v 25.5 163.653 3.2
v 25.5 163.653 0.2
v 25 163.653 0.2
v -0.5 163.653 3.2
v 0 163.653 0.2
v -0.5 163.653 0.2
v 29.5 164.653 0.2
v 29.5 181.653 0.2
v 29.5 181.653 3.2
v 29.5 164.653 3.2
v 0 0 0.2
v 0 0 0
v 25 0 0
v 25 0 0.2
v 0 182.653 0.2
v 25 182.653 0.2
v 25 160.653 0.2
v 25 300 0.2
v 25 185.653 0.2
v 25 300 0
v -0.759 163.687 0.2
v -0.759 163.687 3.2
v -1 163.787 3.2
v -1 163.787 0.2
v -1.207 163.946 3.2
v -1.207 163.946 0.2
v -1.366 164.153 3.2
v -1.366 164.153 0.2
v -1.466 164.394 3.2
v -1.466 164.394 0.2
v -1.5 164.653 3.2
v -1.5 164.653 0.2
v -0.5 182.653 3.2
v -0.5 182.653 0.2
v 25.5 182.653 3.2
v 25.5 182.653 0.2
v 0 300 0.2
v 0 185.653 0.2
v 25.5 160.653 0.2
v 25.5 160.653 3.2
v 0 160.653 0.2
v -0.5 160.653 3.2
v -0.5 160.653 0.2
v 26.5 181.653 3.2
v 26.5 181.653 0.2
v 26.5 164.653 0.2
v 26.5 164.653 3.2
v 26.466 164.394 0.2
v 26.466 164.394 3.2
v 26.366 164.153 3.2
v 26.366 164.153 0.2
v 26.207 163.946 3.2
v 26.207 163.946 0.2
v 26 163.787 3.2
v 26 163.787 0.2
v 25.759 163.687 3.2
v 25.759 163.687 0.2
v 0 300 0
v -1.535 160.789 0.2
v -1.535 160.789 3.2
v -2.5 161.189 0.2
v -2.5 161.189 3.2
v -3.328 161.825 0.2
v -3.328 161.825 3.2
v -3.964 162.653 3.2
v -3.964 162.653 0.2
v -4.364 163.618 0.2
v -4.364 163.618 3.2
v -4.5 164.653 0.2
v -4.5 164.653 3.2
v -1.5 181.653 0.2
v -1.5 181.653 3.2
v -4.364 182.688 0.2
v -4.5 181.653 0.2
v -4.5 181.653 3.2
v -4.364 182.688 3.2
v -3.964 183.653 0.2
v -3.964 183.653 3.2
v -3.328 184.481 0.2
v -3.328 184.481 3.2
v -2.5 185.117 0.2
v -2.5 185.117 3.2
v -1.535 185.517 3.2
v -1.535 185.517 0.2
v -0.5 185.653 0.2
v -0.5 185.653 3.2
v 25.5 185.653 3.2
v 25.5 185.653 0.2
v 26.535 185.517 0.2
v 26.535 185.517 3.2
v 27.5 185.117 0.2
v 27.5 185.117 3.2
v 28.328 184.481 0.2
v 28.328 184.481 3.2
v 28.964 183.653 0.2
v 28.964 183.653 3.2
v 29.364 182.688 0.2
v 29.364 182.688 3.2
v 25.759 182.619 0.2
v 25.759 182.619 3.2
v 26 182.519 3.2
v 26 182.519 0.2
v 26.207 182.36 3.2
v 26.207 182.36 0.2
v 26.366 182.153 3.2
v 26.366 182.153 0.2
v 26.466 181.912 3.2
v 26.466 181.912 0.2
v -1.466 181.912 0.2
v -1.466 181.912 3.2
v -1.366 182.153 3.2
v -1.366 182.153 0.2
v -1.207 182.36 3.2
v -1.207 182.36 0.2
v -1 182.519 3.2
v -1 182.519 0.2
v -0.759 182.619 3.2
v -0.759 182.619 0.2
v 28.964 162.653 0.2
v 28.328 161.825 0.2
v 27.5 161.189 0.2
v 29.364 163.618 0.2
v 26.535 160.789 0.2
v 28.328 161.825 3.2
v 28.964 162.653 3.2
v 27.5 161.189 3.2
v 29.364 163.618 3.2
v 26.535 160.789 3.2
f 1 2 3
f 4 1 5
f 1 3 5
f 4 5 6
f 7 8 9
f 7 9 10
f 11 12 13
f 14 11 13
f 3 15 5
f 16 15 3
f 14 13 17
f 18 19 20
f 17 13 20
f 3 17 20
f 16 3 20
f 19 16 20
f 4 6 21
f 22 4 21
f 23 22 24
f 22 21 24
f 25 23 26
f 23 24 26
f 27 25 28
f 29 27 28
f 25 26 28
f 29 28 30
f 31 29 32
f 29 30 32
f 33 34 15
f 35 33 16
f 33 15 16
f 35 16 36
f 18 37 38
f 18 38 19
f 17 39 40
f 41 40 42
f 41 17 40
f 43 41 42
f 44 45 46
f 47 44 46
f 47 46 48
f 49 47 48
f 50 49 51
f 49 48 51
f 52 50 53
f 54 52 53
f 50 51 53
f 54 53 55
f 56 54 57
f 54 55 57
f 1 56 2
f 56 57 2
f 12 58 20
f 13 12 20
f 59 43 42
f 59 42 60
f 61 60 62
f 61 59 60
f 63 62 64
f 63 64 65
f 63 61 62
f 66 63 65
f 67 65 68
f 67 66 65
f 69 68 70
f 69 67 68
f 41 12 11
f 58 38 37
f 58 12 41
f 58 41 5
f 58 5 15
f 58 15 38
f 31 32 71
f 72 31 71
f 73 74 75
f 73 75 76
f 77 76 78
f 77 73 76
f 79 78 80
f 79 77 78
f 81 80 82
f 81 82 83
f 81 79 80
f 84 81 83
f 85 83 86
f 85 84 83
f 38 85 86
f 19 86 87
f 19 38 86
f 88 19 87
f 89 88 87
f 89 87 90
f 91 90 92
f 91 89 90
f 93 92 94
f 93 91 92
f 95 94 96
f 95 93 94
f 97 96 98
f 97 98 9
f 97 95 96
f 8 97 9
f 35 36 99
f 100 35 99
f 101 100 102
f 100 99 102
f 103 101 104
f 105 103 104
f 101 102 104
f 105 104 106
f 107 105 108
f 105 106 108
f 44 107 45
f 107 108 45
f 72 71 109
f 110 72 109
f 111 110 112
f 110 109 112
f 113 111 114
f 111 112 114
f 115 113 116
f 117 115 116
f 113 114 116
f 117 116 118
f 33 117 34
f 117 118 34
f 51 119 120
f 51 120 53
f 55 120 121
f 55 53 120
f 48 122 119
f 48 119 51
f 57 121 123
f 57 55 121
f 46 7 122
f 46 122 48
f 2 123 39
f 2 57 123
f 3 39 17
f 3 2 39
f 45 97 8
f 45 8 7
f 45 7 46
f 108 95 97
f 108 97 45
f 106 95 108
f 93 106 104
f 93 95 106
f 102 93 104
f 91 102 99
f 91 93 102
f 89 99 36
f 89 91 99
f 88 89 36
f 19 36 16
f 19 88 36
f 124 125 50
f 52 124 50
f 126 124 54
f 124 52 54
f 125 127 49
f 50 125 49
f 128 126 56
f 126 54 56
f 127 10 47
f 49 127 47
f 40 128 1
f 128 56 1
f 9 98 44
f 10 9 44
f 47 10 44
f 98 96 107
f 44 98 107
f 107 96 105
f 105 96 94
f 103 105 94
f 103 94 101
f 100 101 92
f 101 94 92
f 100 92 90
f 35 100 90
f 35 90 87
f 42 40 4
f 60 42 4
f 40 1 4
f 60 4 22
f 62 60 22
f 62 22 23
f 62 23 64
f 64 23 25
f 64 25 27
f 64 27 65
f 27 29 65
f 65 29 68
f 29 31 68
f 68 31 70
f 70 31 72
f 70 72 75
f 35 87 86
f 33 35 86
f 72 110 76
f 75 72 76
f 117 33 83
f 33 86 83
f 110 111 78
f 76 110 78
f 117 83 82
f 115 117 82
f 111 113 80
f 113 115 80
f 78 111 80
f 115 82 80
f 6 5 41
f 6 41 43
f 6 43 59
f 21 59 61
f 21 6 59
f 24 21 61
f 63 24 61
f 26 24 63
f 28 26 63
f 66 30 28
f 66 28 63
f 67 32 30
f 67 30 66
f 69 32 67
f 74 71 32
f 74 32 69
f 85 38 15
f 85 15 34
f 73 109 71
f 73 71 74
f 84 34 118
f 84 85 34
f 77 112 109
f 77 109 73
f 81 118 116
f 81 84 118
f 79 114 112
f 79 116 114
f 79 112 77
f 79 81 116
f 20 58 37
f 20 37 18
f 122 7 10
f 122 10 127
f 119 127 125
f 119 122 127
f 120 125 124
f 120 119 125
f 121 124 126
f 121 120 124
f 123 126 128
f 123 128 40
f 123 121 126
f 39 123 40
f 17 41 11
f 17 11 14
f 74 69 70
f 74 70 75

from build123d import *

# Parameters (mm, degrees)
ESQUISSE1_W      = 25
ESQUISSE1_H      = 300
EXTRUSION1_DEPTH = 0.2
EXTRUSION2_DEPTH = 3


with BuildPart() as part:
    # Esquisse1 → Extrusion1 (new body)
    with BuildSketch(Plane.XY):
        with Locations((12.5, 150)):
            Rectangle(ESQUISSE1_W, ESQUISSE1_H)
    extrude(amount=EXTRUSION1_DEPTH)

    # Esquisse2 → Extrusion2 (add)
    with BuildSketch(Plane.XY.offset(0.2)):
        with BuildLine():
            Line((-0.5, 185.652949425), (25.5, 185.652949425))
            ThreePointArc((25.5, 185.652949425), (28.328427125, 184.48137655), (29.5, 181.652949425))
            Line((29.5, 181.652949425), (29.5, 164.652949425))
            ThreePointArc((29.5, 164.652949425), (28.328427125, 161.8245223), (25.5, 160.652949425))
            Line((25.5, 160.652949425), (-0.5, 160.652949425))
            ThreePointArc((-0.5, 160.652949425), (-3.328427125, 161.8245223), (-4.5, 164.652949425))
            Line((-4.5, 164.652949425), (-4.5, 181.652949425))
            ThreePointArc((-4.5, 181.652949425), (-3.328427125, 184.48137655), (-0.5, 185.652949425))
        make_face()
        with BuildLine():
            Line((-0.5, 182.652949425), (25.5, 182.652949425))
            ThreePointArc((25.5, 182.652949425), (26.207106781, 182.360056206), (26.5, 181.652949425))
            Line((26.5, 181.652949425), (26.5, 164.652949425))
            ThreePointArc((26.5, 164.652949425), (26.207106781, 163.945842644), (25.5, 163.652949425))
            Line((25.5, 163.652949425), (-0.5, 163.652949425))
            ThreePointArc((-0.5, 163.652949425), (-1.207106781, 163.945842644), (-1.5, 164.652949425))
            Line((-1.5, 164.652949425), (-1.5, 181.652949425))
            ThreePointArc((-1.5, 181.652949425), (-1.207106781, 182.360056206), (-0.5, 182.652949425))
        make_face(mode=Mode.SUBTRACT)
    extrude(amount=EXTRUSION2_DEPTH)


solid = part.part
